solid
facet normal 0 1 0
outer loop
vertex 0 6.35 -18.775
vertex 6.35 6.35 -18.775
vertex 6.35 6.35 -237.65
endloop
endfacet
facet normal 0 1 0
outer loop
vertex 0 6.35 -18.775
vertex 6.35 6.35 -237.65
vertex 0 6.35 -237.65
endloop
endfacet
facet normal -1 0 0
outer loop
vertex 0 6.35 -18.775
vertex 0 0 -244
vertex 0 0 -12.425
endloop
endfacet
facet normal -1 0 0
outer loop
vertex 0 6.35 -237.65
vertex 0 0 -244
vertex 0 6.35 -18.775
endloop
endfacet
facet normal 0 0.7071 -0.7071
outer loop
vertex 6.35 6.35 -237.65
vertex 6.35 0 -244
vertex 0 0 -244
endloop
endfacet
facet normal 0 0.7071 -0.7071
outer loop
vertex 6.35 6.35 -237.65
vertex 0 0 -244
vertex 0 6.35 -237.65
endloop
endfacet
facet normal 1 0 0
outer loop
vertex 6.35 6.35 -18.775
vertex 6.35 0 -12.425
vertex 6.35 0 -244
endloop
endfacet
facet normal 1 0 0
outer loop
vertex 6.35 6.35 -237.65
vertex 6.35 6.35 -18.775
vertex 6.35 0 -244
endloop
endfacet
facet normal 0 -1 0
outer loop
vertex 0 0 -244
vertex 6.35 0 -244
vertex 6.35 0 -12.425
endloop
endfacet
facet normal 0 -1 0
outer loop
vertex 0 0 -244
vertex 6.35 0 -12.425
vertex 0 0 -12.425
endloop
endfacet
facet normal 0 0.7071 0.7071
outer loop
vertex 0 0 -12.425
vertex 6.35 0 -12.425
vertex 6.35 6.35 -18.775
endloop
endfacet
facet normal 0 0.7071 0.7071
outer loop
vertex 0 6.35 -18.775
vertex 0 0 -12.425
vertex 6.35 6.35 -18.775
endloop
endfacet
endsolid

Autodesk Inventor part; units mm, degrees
ref_plane "YZ Plane" through (0, 0, 0) normal (1, 0, 0) x (0, 1, 0)
ref_plane "XZ Plane" through (0, 0, 0) normal (0, 1, 0) x (-1, 0, 0)
ref_plane "XY Plane" through (0, 0, 0) normal (0, 0, 1) x (1, 0, 0)
sketch "Sketch1" plane through (0, 0, 0) normal (0, 1, 0) x (-1, 0, 0)
  line L0 (0, 0) -> (-6.35, 0)
  line L1 (-6.35, 0) -> (-6.35, -244)
  line L2 (-6.35, -244) -> (0, -244)
  line L3 (0, -244) -> (0, 0)
  dimension "d0" = 6.35
  dimension "d1" = 244
extrude "Extrusion1" add sketch "Sketch1" along normal blind 6.35
sketch "Sketch2" plane through (6.35, 0, 0) normal (1, 0, 0) x (0, 0, -1)
  line L0 (0, 0) -> (244, 0) projected
  line L1 (0, 0) -> (6.35, 6.35)
  line L2 (0, 6.35) -> (244, 6.35) projected
  line L3 (0, 0) -> (8.9803, 0) construction
  line L4 (6.35, 6.35) -> (0, 6.35)
  line L5 (0, 6.35) -> (0, 0)
  dimension "d4" = 45
extrude "Extrusion2" cut sketch "Sketch2" against normal blind 10
sketch "Sketch3" plane through (6.35, 0, -244) normal (1, 0, 0) x (0, 0, -1)
  line L0 (0, 0) -> (-6.35, 6.35)
  line L1 (0, 6.35) -> (-237.65, 6.35) projected
  line L2 (0, 0) -> (8.9803, 0) construction
  line L3 (-6.35, 6.35) -> (0, 6.35)
  line L4 (0, 6.35) -> (0, 0)
  point P0 (-244, 0)
  dimension "d7" = 135
extrude "Extrusion3" cut sketch "Sketch3" against normal blind 10
sketch "Sketch4" plane through (6.35, 0, 0) normal (1, 0, 0) x (0, 0, -1)
  line L0 (0, 0) -> (6.35, 6.35) projected
  line L1 (244, 0) -> (0, 0) projected
  line L2 (6.35, 0) -> (12.4246, 0)
  line L3 (237.65, 6.35) -> (6.35, 6.35) projected
  line L4 (12.4246, 6.35) -> (12.4246, 0)
  line L5 (12.4246, 6.35) -> (6.35, 6.35)
  line L6 (0, 0) -> (6.35, 0)
  line L7 (0, 0) -> (6.35, 6.35)
  dimension "d11" = 6.35
extrude "Extrusion4" cut sketch "Sketch4" against normal blind 10
sketch "Sketch5" plane through (6.35, 0, -12.4246) normal (1, 0, 0) x (0, 0, -1)
  point P0 (-12.4246, 0)
sketch "Sketch6" plane through (6.35, 0, -12.4246) normal (1, 0, 0) x (0, 0, -1)
  line L0 (0, 6.35) -> (0, 0) projected
  line L1 (0, 0) -> (6.35, 6.35)
  line L2 (225.2254, 6.35) -> (0, 6.35) projected
  line L3 (0, 0) -> (8.9803, 0) construction
  line L4 (6.35, 6.35) -> (0, 6.35)
  line L5 (231.5754, 0) -> (0, 0) projected
  line L6 (0, 6.35) -> (0, 0)
  point P0 (-12.4246, 0)
  dimension "d14" = 45
extrude "Extrusion5" cut sketch "Sketch6" against normal blind 10
properties part number "TopTop"
